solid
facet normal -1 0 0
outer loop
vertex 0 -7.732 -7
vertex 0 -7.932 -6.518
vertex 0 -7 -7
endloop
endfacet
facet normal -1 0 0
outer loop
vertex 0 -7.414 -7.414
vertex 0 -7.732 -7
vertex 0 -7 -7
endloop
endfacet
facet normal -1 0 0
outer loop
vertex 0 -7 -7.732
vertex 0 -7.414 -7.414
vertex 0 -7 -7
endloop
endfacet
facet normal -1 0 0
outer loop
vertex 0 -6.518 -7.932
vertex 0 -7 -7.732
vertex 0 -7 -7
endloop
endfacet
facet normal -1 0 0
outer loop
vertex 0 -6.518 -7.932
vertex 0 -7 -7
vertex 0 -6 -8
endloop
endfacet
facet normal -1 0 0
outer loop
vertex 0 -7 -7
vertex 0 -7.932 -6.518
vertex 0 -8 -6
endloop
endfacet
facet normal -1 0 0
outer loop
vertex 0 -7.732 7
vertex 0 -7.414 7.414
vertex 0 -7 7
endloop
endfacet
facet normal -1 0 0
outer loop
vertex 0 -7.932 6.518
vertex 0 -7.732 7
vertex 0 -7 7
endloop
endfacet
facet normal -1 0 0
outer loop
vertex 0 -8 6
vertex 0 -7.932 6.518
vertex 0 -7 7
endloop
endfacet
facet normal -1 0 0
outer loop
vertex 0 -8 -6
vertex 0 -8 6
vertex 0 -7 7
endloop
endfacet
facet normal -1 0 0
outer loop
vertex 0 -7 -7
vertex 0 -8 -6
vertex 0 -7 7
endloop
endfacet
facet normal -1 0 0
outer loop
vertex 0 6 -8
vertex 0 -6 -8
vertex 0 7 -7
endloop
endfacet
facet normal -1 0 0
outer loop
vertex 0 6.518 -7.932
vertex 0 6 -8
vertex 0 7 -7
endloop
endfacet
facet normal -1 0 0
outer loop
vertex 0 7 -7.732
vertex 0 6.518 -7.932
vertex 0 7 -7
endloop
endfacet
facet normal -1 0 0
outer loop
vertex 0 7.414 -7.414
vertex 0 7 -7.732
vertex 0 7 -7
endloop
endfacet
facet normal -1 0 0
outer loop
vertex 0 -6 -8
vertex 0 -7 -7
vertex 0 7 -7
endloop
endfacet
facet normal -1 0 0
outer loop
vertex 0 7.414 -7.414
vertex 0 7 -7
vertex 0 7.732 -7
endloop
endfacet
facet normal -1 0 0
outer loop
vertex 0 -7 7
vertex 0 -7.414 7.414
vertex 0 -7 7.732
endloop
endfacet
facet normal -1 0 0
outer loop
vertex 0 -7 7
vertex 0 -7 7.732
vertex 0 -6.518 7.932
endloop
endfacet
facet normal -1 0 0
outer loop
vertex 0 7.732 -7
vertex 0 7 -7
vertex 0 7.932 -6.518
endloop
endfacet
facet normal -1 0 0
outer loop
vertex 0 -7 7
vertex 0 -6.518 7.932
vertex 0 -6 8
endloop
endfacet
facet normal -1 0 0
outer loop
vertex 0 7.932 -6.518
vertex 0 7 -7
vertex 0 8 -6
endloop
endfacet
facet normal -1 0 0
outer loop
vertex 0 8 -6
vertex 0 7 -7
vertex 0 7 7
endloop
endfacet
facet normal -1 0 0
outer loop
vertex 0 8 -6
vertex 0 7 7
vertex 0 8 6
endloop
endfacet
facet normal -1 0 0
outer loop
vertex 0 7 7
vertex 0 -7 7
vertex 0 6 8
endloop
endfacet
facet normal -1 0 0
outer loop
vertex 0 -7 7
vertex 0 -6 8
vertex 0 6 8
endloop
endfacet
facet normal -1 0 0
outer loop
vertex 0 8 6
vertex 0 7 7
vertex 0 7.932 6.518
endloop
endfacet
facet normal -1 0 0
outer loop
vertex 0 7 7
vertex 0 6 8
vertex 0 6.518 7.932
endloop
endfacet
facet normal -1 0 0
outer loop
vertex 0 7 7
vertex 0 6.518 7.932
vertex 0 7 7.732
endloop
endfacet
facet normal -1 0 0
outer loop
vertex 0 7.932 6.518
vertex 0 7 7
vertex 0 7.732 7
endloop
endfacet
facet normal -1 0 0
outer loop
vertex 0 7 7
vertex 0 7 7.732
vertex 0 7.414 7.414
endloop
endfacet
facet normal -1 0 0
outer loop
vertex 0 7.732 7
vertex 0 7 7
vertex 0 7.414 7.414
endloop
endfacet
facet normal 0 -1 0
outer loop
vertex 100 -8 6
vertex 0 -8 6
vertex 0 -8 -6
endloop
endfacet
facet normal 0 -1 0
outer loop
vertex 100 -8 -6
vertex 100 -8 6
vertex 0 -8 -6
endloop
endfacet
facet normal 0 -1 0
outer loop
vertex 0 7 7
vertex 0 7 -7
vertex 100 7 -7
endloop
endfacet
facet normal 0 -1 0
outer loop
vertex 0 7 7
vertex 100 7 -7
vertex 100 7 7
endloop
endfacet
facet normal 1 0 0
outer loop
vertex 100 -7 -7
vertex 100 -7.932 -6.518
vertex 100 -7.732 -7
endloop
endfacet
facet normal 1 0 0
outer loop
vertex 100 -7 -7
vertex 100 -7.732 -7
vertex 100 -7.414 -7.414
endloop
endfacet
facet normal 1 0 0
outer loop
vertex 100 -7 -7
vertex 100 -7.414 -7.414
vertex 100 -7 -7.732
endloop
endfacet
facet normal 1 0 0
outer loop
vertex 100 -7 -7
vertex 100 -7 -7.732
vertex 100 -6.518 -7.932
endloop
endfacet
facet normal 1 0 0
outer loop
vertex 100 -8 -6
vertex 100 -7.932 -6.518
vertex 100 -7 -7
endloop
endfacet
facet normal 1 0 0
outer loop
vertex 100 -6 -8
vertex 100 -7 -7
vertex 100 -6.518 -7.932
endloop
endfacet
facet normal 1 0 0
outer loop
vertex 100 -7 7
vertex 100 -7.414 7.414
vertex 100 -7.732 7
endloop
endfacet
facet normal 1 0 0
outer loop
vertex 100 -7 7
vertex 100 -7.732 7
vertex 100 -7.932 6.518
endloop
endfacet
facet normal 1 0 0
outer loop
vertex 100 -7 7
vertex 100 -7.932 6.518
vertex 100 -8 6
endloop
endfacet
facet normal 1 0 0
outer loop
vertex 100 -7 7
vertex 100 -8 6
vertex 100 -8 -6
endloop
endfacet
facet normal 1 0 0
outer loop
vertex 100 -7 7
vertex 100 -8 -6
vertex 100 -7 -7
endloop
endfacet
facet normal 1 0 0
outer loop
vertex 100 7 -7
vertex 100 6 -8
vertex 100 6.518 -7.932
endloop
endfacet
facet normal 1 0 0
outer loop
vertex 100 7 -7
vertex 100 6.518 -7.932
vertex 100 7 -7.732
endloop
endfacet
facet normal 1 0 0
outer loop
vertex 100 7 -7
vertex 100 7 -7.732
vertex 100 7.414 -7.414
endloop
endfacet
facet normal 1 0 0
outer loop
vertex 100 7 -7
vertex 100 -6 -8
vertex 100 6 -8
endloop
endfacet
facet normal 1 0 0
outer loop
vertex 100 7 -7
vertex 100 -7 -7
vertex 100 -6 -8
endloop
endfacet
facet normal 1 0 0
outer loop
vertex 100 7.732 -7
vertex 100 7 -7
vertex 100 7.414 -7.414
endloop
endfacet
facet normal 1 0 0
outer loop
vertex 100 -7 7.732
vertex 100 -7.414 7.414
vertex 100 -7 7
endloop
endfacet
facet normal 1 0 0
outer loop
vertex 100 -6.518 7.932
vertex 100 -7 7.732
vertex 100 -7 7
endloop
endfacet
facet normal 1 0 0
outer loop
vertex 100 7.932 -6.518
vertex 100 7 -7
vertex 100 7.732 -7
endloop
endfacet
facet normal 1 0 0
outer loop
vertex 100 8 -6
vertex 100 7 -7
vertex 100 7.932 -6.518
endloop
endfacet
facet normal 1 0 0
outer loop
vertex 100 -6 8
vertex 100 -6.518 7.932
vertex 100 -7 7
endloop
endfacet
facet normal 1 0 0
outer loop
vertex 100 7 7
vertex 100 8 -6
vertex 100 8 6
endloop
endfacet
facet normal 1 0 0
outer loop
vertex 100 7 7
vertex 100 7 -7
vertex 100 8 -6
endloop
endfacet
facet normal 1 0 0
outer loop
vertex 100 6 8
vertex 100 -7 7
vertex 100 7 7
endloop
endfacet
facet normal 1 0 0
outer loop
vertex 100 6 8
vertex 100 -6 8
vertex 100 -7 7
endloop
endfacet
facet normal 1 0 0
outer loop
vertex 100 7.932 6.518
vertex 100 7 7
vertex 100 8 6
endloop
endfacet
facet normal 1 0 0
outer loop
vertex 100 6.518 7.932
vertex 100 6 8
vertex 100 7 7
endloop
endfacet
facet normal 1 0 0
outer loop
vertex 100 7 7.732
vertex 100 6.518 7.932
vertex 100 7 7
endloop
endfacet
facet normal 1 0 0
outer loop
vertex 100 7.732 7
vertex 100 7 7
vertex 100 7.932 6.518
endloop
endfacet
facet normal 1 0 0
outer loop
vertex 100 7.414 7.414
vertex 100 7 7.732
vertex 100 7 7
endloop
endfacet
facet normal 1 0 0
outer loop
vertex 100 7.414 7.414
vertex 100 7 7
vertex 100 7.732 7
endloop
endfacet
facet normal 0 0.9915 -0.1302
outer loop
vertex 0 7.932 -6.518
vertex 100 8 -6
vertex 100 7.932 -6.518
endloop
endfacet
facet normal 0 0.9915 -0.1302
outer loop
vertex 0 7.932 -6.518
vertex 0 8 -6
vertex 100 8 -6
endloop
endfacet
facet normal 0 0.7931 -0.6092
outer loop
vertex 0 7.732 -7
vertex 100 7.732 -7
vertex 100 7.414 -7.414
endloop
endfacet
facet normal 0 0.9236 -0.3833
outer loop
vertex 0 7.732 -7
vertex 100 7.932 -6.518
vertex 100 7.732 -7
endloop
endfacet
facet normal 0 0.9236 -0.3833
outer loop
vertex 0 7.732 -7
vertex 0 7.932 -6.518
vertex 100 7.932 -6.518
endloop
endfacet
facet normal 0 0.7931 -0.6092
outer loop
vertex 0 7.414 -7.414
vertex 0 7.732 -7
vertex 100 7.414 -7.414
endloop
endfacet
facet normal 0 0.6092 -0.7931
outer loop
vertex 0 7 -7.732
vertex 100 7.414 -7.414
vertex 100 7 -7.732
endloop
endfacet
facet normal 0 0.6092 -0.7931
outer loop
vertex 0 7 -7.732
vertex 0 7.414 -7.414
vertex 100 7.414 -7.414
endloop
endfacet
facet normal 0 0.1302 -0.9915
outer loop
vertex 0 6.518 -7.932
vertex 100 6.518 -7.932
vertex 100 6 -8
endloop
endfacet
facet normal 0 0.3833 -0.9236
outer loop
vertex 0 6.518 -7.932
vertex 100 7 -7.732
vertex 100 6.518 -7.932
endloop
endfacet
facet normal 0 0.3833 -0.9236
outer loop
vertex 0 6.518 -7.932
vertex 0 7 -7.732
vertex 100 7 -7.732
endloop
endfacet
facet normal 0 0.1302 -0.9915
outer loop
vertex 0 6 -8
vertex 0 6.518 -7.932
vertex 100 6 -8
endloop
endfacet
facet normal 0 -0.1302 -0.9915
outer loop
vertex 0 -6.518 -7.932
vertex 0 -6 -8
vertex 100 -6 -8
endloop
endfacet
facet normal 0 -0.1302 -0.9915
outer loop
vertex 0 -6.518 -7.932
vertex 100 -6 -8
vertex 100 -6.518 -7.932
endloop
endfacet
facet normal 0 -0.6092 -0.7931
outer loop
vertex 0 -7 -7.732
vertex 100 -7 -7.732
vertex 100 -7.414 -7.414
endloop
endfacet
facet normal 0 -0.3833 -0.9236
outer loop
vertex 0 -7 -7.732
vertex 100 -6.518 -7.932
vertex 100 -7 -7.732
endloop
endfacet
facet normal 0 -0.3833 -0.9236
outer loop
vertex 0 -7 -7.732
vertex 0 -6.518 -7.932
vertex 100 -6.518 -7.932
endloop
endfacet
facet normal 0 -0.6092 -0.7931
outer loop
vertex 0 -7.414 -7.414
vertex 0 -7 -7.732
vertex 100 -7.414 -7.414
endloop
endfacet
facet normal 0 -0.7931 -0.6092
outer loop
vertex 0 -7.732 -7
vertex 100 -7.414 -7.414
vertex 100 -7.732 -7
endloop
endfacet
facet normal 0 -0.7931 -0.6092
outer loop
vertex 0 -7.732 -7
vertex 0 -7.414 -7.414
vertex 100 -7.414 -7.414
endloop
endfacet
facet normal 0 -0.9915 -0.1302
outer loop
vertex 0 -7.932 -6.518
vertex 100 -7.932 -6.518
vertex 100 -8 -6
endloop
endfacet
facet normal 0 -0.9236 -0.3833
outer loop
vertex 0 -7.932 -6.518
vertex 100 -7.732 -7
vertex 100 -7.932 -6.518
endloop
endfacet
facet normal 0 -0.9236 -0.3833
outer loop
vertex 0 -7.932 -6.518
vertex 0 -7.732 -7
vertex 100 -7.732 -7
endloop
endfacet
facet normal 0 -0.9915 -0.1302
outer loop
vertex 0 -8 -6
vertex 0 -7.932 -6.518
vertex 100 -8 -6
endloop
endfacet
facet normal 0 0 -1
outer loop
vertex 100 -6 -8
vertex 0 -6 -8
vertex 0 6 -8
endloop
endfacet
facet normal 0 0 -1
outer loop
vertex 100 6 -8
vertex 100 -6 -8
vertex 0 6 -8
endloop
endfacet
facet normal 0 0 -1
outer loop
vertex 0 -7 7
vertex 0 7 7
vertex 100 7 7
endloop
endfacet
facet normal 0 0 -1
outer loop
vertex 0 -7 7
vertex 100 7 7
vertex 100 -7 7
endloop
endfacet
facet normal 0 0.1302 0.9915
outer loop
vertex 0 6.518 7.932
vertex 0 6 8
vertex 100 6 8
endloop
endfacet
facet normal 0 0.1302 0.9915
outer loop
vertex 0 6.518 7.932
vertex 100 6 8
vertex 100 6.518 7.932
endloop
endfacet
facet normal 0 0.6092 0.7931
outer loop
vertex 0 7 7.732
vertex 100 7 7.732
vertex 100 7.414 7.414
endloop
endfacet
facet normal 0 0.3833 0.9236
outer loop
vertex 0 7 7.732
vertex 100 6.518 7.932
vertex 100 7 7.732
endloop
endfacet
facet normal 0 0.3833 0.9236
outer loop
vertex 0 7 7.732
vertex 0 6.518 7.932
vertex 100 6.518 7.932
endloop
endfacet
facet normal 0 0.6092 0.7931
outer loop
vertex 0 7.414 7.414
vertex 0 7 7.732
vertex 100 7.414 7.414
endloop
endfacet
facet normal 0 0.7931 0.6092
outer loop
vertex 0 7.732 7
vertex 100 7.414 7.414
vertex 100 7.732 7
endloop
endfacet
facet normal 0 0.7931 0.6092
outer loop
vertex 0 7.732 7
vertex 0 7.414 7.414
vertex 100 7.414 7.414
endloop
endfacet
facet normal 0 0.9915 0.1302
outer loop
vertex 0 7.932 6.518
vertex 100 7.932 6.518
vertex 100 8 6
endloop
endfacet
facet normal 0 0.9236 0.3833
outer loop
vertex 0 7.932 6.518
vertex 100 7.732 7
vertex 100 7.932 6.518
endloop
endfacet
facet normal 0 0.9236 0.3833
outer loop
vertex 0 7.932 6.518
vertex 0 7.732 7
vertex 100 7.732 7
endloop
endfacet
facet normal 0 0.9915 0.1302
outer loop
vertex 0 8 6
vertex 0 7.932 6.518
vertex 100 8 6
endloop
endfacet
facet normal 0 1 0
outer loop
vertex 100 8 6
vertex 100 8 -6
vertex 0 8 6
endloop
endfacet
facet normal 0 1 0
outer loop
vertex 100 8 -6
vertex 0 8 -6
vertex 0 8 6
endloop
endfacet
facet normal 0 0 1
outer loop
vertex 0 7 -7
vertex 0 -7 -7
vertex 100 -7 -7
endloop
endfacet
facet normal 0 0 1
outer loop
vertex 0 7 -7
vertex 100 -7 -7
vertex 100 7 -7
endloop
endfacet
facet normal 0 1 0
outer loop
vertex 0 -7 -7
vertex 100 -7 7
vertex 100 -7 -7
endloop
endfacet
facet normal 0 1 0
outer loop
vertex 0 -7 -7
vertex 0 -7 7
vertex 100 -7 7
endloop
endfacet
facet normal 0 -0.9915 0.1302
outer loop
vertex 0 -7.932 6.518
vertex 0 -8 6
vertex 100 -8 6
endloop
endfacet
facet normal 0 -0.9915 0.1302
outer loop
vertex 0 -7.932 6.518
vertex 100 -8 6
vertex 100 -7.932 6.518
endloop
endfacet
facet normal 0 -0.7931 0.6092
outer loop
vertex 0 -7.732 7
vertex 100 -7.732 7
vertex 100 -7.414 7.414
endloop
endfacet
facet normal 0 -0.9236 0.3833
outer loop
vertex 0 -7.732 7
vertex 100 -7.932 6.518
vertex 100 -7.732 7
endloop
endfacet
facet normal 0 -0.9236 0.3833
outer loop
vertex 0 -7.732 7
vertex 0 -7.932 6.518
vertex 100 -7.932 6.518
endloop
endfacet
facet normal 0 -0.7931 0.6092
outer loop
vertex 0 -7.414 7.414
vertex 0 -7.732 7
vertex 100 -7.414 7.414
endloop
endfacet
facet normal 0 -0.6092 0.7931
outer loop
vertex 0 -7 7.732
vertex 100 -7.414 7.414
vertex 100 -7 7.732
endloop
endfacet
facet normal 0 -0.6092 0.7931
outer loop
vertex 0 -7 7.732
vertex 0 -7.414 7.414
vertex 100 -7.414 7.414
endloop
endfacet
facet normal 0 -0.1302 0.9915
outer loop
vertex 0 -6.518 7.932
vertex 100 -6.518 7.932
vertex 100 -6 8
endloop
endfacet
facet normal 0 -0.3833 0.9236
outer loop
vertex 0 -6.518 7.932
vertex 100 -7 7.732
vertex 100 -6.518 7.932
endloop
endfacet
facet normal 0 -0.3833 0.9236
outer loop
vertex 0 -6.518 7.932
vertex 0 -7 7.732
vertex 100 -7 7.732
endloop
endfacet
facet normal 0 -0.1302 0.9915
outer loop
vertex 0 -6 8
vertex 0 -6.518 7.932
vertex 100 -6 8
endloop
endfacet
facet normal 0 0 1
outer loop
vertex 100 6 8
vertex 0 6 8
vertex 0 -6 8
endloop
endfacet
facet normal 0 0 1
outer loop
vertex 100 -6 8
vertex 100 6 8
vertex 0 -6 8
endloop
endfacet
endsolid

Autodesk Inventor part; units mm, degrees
ref_plane "YZ Plane" through (0, 0, 0) normal (1, 0, 0) x (0, 1, 0)
ref_plane "XZ Plane" through (0, 0, 0) normal (0, 1, 0) x (-1, 0, 0)
ref_plane "XY Plane" through (0, 0, 0) normal (0, 0, 1) x (1, 0, 0)
sketch "Sketch1" plane through (0, 0, 0) normal (1, 0, 0) x (0, 1, 0)
  line L0 (7, 7) -> (-7, 7)
  line L1 (-7, 7) -> (-7, -7)
  line L2 (-7, -7) -> (7, -7)
  line L3 (7, -7) -> (7, 7)
  line L4 (7, 7) -> (-7, -7) construction
  line L5 (-7, 7) -> (7, -7) construction
  line L6 (6, 8) -> (-6, 8)
  line L7 (-8, 6) -> (-8, -6)
  line L8 (-6, -8) -> (6, -8)
  line L9 (8, -6) -> (8, 6)
  line L10 (8, 8) -> (-8, -8) construction
  line L11 (-8, 8) -> (8, -8) construction
  arc A0 (8, 6) -> (6, 8) centre (6, 6) ccw
  arc A1 (-6, 8) -> (-8, 6) centre (-6, 6) ccw
  arc A2 (-8, -6) -> (-6, -8) centre (-6, -6) ccw
  arc A3 (6, -8) -> (8, -6) centre (6, -6) ccw
  point P0 (0, 0)
  dimension "d0" = 14
  dimension "d1" = 14
  dimension "d2" = 16
  dimension "d3" = 16
  dimension "d4" = 2
extrude "Extrusion1" add sketch "Sketch1" along normal blind 100
properties part number "suspension2chassis"
